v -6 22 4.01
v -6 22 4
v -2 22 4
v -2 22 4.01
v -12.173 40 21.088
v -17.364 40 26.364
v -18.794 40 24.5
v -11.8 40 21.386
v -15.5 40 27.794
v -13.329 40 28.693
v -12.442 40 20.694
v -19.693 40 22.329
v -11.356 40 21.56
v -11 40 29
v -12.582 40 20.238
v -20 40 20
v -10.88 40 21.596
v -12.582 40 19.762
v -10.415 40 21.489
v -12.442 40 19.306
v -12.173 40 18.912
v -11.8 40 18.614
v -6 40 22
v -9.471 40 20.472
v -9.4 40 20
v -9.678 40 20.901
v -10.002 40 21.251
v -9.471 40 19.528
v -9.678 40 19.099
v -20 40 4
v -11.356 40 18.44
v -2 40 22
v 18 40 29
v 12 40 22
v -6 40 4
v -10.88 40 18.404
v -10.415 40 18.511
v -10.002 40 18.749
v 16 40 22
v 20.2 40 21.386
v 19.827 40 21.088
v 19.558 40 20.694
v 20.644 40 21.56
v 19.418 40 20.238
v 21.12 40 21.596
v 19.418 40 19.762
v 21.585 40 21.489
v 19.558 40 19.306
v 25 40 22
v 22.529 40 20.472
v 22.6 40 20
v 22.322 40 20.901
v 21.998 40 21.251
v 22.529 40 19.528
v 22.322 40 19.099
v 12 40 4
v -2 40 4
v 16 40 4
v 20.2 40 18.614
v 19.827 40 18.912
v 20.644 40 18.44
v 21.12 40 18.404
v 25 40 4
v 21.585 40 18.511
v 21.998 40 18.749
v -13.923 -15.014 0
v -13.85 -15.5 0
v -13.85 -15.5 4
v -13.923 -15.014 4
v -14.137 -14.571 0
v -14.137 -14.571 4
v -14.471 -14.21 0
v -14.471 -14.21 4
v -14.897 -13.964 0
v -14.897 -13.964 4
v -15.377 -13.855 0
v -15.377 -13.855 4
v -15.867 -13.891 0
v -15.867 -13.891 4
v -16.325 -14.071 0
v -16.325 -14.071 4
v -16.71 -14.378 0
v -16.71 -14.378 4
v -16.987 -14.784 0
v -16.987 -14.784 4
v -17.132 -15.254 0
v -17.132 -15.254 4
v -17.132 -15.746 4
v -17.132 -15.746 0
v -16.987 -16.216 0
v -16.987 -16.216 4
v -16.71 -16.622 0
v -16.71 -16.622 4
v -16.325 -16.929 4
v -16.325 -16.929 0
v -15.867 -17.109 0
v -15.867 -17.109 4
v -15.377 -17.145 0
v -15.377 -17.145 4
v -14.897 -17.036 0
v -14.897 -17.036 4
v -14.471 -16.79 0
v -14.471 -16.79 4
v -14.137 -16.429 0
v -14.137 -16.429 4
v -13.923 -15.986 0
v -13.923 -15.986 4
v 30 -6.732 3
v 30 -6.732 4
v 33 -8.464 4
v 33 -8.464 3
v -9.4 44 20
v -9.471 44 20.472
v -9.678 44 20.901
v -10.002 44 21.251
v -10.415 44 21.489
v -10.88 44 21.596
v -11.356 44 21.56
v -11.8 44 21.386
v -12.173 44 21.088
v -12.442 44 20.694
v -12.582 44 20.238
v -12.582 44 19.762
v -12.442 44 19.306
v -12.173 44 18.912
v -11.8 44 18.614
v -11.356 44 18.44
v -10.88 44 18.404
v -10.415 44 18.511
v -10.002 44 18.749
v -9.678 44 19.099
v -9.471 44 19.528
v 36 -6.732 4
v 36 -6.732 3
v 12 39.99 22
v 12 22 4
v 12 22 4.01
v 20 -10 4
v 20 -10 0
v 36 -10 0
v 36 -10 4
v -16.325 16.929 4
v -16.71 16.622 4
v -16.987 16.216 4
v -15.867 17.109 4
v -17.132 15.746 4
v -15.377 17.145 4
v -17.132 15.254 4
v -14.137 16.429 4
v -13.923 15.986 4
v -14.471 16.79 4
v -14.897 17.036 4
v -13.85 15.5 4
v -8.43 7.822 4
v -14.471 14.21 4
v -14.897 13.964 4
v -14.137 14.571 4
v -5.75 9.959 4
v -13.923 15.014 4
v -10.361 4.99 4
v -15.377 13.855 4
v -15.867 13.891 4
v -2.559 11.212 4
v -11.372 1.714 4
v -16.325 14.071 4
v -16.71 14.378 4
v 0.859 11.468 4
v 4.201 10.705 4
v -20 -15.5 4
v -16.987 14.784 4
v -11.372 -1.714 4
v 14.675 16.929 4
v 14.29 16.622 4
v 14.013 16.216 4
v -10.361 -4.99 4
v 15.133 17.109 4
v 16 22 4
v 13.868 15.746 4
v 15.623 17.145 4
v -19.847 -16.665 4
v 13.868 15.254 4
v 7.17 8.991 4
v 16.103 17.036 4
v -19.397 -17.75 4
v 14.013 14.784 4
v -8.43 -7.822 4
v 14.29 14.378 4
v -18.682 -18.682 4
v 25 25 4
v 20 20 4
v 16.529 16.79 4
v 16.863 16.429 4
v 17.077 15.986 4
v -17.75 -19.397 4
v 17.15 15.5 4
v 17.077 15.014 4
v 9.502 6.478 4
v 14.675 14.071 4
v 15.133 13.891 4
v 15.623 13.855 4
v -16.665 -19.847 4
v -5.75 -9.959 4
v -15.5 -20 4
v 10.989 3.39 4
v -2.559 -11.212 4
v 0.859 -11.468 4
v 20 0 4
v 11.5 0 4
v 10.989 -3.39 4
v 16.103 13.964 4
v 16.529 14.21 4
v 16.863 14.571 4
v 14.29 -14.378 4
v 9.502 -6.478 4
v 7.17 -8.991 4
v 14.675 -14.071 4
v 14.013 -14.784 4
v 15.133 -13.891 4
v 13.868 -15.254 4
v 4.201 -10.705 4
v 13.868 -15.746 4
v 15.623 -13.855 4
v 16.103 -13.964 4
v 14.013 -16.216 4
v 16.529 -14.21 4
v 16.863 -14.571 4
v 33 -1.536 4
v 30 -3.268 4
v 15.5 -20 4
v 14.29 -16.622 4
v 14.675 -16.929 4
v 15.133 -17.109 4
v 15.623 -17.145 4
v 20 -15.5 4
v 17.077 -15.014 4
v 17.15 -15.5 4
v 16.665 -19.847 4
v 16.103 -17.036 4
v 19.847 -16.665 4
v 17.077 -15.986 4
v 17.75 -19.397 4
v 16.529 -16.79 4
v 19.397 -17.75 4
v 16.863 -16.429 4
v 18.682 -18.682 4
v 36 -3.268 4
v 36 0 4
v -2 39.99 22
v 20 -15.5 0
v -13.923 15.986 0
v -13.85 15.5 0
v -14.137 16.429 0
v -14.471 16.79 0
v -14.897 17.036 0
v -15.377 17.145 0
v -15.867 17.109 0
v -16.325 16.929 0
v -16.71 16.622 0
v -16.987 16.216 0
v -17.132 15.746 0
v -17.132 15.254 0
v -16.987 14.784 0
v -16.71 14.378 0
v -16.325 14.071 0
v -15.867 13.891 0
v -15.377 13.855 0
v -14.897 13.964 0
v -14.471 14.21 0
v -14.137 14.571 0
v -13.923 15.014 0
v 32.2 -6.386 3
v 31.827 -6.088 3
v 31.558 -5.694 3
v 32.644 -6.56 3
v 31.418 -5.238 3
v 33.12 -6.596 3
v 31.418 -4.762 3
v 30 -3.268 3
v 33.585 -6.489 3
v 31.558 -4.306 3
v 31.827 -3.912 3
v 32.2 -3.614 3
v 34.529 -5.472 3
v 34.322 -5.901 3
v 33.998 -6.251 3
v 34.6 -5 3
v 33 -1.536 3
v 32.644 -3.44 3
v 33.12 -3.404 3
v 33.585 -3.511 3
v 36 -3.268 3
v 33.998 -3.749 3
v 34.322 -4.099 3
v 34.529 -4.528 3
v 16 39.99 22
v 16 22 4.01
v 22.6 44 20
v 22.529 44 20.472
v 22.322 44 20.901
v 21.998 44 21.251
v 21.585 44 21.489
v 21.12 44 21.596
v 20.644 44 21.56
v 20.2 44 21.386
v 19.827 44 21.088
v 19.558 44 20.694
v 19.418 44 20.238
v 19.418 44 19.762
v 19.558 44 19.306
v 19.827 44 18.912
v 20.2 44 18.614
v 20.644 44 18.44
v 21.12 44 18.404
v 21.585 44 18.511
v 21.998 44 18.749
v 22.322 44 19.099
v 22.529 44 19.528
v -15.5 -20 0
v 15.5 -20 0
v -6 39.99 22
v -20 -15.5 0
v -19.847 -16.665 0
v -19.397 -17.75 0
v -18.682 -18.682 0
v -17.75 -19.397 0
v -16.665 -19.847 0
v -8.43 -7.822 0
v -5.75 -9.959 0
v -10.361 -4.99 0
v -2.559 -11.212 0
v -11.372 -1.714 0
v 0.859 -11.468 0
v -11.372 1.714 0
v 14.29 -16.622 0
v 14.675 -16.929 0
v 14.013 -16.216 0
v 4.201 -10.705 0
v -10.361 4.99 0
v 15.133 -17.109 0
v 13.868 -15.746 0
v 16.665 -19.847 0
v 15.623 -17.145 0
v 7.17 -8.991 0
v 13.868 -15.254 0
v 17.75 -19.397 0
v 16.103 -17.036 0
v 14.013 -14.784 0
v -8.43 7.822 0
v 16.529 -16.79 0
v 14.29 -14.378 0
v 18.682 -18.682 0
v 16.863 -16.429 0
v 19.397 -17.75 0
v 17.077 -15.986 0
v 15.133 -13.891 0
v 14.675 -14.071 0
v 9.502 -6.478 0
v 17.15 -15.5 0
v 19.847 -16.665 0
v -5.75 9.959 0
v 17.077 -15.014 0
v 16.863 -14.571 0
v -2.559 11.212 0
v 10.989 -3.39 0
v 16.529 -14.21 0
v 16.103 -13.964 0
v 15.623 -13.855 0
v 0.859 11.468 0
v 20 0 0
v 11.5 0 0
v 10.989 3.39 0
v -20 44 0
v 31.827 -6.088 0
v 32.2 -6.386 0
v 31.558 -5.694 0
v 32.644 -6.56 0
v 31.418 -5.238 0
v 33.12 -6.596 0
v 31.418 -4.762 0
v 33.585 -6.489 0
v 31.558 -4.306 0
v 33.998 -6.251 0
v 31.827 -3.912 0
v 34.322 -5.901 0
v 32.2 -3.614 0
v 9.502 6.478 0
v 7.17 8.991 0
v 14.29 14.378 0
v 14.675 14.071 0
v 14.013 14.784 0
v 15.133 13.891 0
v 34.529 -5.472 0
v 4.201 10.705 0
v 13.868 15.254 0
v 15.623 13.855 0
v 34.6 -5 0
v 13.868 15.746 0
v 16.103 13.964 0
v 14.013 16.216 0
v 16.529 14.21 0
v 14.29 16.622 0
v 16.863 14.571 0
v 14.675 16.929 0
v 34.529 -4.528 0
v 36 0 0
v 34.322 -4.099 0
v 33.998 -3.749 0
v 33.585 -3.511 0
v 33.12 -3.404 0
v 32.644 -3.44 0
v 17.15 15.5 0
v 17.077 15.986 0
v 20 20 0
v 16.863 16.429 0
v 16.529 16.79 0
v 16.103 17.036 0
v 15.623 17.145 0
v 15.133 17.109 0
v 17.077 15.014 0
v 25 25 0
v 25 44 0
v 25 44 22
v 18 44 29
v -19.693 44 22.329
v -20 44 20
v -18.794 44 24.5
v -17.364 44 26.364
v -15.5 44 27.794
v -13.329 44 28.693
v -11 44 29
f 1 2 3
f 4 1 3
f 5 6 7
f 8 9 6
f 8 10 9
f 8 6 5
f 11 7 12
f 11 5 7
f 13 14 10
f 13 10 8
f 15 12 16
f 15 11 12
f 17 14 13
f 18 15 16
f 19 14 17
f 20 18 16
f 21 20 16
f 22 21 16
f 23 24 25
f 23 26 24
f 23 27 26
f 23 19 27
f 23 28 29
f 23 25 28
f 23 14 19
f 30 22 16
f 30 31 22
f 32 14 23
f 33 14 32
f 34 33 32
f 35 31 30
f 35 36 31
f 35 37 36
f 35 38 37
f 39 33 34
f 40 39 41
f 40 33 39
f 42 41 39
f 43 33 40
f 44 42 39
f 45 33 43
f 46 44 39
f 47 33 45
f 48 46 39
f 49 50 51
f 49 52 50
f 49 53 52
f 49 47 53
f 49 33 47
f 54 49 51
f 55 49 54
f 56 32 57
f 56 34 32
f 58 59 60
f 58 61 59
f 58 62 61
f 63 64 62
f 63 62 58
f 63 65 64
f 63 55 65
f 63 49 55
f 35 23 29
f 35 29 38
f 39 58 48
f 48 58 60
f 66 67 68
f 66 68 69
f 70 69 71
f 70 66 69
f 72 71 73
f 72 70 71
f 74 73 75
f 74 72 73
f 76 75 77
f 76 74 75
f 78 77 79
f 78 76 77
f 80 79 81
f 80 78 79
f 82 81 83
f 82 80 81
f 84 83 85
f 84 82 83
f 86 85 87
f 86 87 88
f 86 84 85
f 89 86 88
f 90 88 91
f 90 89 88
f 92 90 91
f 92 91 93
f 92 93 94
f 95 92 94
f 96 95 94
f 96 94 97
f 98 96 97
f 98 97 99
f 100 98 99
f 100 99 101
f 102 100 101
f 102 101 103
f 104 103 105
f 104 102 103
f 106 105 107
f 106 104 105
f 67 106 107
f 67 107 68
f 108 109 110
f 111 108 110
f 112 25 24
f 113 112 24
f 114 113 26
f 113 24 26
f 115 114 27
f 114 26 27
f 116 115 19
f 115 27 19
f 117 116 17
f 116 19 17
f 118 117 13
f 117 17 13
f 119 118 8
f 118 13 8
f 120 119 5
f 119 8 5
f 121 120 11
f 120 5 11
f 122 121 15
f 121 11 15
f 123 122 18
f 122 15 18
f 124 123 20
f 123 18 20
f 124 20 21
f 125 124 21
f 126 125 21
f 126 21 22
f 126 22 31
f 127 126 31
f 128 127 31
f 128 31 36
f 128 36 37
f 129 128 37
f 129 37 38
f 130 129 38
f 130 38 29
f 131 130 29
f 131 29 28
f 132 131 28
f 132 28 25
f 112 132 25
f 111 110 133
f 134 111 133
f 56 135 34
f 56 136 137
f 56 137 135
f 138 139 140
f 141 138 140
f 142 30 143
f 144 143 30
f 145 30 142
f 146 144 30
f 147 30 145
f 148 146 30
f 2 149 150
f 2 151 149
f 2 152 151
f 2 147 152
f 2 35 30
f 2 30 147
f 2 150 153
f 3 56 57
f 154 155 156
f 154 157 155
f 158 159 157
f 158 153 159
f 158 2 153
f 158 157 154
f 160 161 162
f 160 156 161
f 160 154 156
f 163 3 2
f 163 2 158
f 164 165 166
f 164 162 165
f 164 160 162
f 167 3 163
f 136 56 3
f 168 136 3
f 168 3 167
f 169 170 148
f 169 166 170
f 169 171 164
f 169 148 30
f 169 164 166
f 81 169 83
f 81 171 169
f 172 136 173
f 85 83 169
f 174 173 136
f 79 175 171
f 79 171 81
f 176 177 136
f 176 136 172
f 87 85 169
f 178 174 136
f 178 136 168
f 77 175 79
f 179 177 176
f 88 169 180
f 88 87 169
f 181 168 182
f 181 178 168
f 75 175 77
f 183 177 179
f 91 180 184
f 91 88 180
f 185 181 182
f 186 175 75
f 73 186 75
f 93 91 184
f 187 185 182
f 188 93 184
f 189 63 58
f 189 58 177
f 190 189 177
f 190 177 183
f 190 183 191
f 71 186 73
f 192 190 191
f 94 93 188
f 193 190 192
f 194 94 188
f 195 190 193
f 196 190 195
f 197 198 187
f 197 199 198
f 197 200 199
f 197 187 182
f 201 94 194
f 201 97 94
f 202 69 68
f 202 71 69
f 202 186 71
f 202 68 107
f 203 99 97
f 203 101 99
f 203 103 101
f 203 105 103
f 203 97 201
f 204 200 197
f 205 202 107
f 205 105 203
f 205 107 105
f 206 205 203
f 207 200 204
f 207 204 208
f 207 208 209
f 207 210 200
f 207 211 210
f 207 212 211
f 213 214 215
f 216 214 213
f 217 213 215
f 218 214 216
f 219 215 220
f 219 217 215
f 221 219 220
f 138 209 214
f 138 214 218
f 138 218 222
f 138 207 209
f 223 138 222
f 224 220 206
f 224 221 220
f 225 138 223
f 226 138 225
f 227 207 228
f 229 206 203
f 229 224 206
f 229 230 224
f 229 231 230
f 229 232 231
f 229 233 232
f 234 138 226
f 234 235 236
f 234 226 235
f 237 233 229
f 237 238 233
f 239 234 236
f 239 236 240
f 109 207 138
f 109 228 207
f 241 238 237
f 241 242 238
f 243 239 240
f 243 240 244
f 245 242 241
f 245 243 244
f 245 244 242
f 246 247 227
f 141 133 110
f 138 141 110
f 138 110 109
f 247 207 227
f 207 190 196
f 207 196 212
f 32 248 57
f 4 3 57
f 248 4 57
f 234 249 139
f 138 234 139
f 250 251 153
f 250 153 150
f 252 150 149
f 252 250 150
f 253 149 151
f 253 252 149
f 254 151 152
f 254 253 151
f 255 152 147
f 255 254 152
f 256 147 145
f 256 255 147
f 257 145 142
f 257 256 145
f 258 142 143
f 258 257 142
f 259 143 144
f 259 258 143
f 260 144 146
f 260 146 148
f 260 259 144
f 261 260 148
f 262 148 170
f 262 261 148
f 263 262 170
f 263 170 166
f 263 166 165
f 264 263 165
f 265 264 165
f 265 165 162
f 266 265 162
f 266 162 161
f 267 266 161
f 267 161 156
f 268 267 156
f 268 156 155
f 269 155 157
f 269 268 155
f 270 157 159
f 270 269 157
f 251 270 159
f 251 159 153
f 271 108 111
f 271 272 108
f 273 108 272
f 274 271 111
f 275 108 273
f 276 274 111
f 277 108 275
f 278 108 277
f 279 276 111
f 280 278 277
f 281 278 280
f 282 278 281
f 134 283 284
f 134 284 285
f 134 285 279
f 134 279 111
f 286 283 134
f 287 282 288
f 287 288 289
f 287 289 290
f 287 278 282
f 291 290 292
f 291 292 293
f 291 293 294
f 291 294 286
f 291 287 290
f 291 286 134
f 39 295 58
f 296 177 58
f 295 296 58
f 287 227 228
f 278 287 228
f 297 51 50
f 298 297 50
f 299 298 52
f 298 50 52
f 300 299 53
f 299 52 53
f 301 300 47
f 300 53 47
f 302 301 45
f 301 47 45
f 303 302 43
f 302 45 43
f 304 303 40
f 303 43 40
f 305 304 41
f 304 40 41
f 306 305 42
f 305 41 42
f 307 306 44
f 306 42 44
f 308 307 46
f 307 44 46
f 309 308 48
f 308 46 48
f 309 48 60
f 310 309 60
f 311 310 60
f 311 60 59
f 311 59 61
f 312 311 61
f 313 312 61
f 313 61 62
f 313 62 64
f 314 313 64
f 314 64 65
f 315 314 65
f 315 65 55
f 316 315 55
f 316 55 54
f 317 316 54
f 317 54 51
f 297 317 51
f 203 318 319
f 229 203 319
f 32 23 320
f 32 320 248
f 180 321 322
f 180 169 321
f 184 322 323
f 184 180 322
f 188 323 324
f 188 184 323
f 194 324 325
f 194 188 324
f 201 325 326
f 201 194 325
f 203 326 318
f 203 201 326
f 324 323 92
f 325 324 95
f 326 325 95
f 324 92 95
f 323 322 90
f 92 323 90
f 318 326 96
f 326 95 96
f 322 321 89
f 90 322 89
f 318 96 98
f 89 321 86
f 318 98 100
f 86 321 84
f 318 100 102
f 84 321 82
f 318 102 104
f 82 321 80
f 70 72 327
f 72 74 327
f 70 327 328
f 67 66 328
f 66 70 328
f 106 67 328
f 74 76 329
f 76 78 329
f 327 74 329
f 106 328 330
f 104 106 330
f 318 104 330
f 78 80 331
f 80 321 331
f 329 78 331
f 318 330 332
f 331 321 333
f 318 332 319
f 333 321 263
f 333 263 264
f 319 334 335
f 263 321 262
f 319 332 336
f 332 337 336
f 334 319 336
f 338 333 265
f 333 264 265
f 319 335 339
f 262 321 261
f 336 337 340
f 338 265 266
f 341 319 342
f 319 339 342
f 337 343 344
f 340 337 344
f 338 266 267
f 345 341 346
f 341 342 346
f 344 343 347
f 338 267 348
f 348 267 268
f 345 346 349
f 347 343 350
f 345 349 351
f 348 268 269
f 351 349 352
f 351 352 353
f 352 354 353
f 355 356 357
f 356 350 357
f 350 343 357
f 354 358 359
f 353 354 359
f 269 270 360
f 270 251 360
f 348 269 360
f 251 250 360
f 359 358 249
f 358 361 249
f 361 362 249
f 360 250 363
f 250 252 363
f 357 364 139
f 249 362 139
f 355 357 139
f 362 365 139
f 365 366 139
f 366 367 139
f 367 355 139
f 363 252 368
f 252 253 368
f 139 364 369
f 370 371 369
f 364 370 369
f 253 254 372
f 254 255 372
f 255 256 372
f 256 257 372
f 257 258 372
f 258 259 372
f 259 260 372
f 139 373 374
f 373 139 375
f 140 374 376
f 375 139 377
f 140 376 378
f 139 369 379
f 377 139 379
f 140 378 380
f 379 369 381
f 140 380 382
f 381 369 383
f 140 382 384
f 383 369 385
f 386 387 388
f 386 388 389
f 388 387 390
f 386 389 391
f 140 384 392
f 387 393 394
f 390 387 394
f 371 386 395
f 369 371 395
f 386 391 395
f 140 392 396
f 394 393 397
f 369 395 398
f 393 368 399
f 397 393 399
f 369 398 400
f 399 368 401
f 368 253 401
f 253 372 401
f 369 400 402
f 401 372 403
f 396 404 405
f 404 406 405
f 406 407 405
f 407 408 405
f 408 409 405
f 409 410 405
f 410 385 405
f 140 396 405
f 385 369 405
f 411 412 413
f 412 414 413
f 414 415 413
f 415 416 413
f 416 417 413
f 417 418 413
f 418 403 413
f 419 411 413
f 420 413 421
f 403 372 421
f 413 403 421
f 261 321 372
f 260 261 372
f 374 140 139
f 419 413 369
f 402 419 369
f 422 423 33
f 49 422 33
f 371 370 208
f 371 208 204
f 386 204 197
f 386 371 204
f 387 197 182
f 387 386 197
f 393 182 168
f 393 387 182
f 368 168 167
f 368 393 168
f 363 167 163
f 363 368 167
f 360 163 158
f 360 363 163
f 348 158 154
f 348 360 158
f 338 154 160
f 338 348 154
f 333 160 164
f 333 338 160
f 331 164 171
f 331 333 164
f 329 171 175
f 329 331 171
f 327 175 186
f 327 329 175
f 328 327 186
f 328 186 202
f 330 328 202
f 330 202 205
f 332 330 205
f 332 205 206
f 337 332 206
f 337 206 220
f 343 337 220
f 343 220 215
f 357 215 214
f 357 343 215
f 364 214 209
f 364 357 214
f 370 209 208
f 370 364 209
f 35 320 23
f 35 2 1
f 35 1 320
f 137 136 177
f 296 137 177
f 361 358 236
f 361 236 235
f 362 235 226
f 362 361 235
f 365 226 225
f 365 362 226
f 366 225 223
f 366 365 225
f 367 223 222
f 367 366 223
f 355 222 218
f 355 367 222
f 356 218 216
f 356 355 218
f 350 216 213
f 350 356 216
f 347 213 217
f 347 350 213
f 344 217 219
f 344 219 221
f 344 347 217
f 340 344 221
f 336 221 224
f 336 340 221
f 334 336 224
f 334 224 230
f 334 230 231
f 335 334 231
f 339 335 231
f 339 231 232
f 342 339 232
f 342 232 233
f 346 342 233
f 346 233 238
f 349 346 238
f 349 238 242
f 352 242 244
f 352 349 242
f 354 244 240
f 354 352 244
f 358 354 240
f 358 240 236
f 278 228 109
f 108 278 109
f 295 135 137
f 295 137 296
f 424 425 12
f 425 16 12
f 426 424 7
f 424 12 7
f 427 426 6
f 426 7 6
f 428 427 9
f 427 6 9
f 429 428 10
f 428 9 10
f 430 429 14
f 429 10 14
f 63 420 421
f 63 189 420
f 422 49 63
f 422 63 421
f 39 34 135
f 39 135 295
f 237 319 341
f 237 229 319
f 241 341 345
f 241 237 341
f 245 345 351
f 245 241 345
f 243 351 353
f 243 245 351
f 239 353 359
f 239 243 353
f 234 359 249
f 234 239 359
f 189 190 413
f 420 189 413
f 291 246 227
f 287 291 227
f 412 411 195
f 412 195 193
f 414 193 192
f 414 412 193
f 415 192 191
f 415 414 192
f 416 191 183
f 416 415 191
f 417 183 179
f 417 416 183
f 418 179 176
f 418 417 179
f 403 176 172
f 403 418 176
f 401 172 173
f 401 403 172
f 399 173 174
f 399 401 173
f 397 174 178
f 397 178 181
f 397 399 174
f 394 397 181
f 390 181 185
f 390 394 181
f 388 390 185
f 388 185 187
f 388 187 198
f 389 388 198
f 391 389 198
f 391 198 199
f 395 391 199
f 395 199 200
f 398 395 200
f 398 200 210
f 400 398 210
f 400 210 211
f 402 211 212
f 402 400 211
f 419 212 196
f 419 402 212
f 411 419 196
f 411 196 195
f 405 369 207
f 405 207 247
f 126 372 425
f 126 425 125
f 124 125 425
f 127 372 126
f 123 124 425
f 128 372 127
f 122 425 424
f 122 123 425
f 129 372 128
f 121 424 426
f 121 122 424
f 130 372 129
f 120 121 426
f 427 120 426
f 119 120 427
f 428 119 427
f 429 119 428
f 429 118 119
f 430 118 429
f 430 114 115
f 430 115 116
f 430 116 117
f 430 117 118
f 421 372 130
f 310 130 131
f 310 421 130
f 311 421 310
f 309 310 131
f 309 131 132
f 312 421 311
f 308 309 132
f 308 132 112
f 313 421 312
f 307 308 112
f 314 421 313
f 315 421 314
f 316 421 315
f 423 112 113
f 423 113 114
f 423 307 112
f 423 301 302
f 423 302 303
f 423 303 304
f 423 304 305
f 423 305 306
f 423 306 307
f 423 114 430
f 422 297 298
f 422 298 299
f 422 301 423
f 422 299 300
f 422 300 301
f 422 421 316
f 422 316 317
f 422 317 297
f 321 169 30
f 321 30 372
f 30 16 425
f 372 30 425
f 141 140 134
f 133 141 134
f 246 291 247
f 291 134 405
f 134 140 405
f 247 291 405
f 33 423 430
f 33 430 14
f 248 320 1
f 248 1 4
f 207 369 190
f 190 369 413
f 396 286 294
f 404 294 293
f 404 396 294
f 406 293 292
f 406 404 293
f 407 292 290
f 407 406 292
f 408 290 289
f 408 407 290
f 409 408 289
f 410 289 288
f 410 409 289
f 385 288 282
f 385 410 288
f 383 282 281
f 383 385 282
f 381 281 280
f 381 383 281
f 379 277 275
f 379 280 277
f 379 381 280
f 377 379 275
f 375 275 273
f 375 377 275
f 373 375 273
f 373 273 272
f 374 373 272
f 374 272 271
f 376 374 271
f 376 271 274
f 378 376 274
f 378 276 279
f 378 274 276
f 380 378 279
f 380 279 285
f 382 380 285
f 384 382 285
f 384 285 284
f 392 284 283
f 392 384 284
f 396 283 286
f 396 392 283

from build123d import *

# Parameters (mm, degrees)
PAD001_DEPTH      = 25
PAD001_DEPTH_BACK = 20
SKETCH002_W       = 4
SKETCH002_H       = 18
PAD002_DEPTH      = 22
SKETCH003_R       = 1.6
POCKET_DEPTH      = 44.001
FILLET001_R       = 9
CHAMFER_SIZE      = 7
CHAMFER001_SIZE   = 5
CHAMFER002_SIZE   = 17.99
SKETCH004_W       = 16
SKETCH004_H       = 10
PAD003_DEPTH      = 4
SKETCH005_R       = 1.6
POCKET001_DEPTH   = 4.001
POCKET002_DEPTH   = 1.5
SKETCH_W          = 40
SKETCH_H          = 40
SKETCH_R          = 1.65
SKETCH_R_2        = 11.5
PAD_DEPTH         = 4
FILLET_R          = 4.5


with BuildPart() as clippingbody:
    # Sketch001 → Pad001 (new body, two sides)
    with BuildSketch(Plane.YZ) as pad001_sk:
        Polygon((20, 0), (44, 0), (44, 29), (40, 29), (40, 4), (20, 4), align=None)
    extrude(amount=PAD001_DEPTH)
    extrude(pad001_sk.sketch, amount=-PAD001_DEPTH_BACK)

    # Sketch002 → Pad002 (join)
    with BuildSketch(Plane.XY):
        with Locations((14, 31)):
            Rectangle(SKETCH002_W, SKETCH002_H)
        with Locations((-4, 31)):
            Rectangle(SKETCH002_W, SKETCH002_H)
    extrude(amount=PAD002_DEPTH)

    # Sketch003 → Pocket (cut, through all)
    with BuildSketch(Plane.XZ):
        with Locations((21, 20)):
            Circle(SKETCH003_R)
        with Locations((-11, 20)):
            Circle(SKETCH003_R)
    extrude(amount=-POCKET_DEPTH, mode=Mode.SUBTRACT)

    # Fillet001
    fillet001_edges = [clippingbody.edges().sort_by_distance(p)[0] for p in [
        (-20, 42, 29),
    ]]
    fillet(fillet001_edges, radius=FILLET001_R)

    # Chamfer
    chamfer_edges = [clippingbody.edges().sort_by_distance(p)[0] for p in [
        (25, 42, 29),
    ]]
    chamfer(chamfer_edges, length=CHAMFER_SIZE)

    # Chamfer001
    chamfer001_edges = [clippingbody.edges().sort_by_distance(p)[0] for p in [
        (25, 20, 2),
    ]]
    chamfer(chamfer001_edges, length=CHAMFER001_SIZE)

    # Chamfer002
    chamfer002_edges = [clippingbody.edges().sort_by_distance(p)[0] for p in [
        (-4, 22, 22),
        (14, 22, 22),
    ]]
    chamfer(chamfer002_edges, length=CHAMFER002_SIZE)


with BuildPart() as sidestandbody:
    # Sketch004 → Pad003 (new body)
    with BuildSketch(Plane.XY):
        with Locations((28, -5)):
            Rectangle(SKETCH004_W, SKETCH004_H)
    extrude(amount=PAD003_DEPTH)

    # Sketch005 → Pocket001 (cut, through all)
    with BuildSketch(Plane.XY):
        with Locations((33, -5)):
            Circle(SKETCH005_R)
    extrude(amount=POCKET001_DEPTH, mode=Mode.SUBTRACT)

    # Sketch006 (on DatumPlane) → Pocket002 (cut)
    with BuildSketch(Plane.XY.offset(4.5)):
        Polygon((33, -8.464102), (36, -6.732051), (36, -3.267949), (33, -1.535898), (30, -3.267949), (30, -6.732051), align=None)
    extrude(amount=-POCKET002_DEPTH, mode=Mode.SUBTRACT)


with BuildPart() as holderfusion_refined:
    # Sketch → Pad (new body)
    with BuildSketch(Plane.XY):
        Rectangle(SKETCH_W, SKETCH_H)
        with Locations((-15.5, 15.5)):
            Circle(SKETCH_R, mode=Mode.SUBTRACT)
        with Locations((15.5, 15.5)):
            Circle(SKETCH_R, mode=Mode.SUBTRACT)
        with Locations((15.5, -15.5)):
            Circle(SKETCH_R, mode=Mode.SUBTRACT)
        with Locations((-15.5, -15.5)):
            Circle(SKETCH_R, mode=Mode.SUBTRACT)
        Circle(SKETCH_R_2, mode=Mode.SUBTRACT)
    extrude(amount=PAD_DEPTH)

    # Fillet
    fillet_edges = [holderfusion_refined.edges().sort_by_distance(p)[0] for p in [
        (20, -20, 2),
        (-20, -20, 2),
    ]]
    fillet(fillet_edges, radius=FILLET_R)

    # Fusion: union ClippingBody, SideStandBody
    add(clippingbody.part)
    add(sidestandbody.part)


solid = holderfusion_refined.part
